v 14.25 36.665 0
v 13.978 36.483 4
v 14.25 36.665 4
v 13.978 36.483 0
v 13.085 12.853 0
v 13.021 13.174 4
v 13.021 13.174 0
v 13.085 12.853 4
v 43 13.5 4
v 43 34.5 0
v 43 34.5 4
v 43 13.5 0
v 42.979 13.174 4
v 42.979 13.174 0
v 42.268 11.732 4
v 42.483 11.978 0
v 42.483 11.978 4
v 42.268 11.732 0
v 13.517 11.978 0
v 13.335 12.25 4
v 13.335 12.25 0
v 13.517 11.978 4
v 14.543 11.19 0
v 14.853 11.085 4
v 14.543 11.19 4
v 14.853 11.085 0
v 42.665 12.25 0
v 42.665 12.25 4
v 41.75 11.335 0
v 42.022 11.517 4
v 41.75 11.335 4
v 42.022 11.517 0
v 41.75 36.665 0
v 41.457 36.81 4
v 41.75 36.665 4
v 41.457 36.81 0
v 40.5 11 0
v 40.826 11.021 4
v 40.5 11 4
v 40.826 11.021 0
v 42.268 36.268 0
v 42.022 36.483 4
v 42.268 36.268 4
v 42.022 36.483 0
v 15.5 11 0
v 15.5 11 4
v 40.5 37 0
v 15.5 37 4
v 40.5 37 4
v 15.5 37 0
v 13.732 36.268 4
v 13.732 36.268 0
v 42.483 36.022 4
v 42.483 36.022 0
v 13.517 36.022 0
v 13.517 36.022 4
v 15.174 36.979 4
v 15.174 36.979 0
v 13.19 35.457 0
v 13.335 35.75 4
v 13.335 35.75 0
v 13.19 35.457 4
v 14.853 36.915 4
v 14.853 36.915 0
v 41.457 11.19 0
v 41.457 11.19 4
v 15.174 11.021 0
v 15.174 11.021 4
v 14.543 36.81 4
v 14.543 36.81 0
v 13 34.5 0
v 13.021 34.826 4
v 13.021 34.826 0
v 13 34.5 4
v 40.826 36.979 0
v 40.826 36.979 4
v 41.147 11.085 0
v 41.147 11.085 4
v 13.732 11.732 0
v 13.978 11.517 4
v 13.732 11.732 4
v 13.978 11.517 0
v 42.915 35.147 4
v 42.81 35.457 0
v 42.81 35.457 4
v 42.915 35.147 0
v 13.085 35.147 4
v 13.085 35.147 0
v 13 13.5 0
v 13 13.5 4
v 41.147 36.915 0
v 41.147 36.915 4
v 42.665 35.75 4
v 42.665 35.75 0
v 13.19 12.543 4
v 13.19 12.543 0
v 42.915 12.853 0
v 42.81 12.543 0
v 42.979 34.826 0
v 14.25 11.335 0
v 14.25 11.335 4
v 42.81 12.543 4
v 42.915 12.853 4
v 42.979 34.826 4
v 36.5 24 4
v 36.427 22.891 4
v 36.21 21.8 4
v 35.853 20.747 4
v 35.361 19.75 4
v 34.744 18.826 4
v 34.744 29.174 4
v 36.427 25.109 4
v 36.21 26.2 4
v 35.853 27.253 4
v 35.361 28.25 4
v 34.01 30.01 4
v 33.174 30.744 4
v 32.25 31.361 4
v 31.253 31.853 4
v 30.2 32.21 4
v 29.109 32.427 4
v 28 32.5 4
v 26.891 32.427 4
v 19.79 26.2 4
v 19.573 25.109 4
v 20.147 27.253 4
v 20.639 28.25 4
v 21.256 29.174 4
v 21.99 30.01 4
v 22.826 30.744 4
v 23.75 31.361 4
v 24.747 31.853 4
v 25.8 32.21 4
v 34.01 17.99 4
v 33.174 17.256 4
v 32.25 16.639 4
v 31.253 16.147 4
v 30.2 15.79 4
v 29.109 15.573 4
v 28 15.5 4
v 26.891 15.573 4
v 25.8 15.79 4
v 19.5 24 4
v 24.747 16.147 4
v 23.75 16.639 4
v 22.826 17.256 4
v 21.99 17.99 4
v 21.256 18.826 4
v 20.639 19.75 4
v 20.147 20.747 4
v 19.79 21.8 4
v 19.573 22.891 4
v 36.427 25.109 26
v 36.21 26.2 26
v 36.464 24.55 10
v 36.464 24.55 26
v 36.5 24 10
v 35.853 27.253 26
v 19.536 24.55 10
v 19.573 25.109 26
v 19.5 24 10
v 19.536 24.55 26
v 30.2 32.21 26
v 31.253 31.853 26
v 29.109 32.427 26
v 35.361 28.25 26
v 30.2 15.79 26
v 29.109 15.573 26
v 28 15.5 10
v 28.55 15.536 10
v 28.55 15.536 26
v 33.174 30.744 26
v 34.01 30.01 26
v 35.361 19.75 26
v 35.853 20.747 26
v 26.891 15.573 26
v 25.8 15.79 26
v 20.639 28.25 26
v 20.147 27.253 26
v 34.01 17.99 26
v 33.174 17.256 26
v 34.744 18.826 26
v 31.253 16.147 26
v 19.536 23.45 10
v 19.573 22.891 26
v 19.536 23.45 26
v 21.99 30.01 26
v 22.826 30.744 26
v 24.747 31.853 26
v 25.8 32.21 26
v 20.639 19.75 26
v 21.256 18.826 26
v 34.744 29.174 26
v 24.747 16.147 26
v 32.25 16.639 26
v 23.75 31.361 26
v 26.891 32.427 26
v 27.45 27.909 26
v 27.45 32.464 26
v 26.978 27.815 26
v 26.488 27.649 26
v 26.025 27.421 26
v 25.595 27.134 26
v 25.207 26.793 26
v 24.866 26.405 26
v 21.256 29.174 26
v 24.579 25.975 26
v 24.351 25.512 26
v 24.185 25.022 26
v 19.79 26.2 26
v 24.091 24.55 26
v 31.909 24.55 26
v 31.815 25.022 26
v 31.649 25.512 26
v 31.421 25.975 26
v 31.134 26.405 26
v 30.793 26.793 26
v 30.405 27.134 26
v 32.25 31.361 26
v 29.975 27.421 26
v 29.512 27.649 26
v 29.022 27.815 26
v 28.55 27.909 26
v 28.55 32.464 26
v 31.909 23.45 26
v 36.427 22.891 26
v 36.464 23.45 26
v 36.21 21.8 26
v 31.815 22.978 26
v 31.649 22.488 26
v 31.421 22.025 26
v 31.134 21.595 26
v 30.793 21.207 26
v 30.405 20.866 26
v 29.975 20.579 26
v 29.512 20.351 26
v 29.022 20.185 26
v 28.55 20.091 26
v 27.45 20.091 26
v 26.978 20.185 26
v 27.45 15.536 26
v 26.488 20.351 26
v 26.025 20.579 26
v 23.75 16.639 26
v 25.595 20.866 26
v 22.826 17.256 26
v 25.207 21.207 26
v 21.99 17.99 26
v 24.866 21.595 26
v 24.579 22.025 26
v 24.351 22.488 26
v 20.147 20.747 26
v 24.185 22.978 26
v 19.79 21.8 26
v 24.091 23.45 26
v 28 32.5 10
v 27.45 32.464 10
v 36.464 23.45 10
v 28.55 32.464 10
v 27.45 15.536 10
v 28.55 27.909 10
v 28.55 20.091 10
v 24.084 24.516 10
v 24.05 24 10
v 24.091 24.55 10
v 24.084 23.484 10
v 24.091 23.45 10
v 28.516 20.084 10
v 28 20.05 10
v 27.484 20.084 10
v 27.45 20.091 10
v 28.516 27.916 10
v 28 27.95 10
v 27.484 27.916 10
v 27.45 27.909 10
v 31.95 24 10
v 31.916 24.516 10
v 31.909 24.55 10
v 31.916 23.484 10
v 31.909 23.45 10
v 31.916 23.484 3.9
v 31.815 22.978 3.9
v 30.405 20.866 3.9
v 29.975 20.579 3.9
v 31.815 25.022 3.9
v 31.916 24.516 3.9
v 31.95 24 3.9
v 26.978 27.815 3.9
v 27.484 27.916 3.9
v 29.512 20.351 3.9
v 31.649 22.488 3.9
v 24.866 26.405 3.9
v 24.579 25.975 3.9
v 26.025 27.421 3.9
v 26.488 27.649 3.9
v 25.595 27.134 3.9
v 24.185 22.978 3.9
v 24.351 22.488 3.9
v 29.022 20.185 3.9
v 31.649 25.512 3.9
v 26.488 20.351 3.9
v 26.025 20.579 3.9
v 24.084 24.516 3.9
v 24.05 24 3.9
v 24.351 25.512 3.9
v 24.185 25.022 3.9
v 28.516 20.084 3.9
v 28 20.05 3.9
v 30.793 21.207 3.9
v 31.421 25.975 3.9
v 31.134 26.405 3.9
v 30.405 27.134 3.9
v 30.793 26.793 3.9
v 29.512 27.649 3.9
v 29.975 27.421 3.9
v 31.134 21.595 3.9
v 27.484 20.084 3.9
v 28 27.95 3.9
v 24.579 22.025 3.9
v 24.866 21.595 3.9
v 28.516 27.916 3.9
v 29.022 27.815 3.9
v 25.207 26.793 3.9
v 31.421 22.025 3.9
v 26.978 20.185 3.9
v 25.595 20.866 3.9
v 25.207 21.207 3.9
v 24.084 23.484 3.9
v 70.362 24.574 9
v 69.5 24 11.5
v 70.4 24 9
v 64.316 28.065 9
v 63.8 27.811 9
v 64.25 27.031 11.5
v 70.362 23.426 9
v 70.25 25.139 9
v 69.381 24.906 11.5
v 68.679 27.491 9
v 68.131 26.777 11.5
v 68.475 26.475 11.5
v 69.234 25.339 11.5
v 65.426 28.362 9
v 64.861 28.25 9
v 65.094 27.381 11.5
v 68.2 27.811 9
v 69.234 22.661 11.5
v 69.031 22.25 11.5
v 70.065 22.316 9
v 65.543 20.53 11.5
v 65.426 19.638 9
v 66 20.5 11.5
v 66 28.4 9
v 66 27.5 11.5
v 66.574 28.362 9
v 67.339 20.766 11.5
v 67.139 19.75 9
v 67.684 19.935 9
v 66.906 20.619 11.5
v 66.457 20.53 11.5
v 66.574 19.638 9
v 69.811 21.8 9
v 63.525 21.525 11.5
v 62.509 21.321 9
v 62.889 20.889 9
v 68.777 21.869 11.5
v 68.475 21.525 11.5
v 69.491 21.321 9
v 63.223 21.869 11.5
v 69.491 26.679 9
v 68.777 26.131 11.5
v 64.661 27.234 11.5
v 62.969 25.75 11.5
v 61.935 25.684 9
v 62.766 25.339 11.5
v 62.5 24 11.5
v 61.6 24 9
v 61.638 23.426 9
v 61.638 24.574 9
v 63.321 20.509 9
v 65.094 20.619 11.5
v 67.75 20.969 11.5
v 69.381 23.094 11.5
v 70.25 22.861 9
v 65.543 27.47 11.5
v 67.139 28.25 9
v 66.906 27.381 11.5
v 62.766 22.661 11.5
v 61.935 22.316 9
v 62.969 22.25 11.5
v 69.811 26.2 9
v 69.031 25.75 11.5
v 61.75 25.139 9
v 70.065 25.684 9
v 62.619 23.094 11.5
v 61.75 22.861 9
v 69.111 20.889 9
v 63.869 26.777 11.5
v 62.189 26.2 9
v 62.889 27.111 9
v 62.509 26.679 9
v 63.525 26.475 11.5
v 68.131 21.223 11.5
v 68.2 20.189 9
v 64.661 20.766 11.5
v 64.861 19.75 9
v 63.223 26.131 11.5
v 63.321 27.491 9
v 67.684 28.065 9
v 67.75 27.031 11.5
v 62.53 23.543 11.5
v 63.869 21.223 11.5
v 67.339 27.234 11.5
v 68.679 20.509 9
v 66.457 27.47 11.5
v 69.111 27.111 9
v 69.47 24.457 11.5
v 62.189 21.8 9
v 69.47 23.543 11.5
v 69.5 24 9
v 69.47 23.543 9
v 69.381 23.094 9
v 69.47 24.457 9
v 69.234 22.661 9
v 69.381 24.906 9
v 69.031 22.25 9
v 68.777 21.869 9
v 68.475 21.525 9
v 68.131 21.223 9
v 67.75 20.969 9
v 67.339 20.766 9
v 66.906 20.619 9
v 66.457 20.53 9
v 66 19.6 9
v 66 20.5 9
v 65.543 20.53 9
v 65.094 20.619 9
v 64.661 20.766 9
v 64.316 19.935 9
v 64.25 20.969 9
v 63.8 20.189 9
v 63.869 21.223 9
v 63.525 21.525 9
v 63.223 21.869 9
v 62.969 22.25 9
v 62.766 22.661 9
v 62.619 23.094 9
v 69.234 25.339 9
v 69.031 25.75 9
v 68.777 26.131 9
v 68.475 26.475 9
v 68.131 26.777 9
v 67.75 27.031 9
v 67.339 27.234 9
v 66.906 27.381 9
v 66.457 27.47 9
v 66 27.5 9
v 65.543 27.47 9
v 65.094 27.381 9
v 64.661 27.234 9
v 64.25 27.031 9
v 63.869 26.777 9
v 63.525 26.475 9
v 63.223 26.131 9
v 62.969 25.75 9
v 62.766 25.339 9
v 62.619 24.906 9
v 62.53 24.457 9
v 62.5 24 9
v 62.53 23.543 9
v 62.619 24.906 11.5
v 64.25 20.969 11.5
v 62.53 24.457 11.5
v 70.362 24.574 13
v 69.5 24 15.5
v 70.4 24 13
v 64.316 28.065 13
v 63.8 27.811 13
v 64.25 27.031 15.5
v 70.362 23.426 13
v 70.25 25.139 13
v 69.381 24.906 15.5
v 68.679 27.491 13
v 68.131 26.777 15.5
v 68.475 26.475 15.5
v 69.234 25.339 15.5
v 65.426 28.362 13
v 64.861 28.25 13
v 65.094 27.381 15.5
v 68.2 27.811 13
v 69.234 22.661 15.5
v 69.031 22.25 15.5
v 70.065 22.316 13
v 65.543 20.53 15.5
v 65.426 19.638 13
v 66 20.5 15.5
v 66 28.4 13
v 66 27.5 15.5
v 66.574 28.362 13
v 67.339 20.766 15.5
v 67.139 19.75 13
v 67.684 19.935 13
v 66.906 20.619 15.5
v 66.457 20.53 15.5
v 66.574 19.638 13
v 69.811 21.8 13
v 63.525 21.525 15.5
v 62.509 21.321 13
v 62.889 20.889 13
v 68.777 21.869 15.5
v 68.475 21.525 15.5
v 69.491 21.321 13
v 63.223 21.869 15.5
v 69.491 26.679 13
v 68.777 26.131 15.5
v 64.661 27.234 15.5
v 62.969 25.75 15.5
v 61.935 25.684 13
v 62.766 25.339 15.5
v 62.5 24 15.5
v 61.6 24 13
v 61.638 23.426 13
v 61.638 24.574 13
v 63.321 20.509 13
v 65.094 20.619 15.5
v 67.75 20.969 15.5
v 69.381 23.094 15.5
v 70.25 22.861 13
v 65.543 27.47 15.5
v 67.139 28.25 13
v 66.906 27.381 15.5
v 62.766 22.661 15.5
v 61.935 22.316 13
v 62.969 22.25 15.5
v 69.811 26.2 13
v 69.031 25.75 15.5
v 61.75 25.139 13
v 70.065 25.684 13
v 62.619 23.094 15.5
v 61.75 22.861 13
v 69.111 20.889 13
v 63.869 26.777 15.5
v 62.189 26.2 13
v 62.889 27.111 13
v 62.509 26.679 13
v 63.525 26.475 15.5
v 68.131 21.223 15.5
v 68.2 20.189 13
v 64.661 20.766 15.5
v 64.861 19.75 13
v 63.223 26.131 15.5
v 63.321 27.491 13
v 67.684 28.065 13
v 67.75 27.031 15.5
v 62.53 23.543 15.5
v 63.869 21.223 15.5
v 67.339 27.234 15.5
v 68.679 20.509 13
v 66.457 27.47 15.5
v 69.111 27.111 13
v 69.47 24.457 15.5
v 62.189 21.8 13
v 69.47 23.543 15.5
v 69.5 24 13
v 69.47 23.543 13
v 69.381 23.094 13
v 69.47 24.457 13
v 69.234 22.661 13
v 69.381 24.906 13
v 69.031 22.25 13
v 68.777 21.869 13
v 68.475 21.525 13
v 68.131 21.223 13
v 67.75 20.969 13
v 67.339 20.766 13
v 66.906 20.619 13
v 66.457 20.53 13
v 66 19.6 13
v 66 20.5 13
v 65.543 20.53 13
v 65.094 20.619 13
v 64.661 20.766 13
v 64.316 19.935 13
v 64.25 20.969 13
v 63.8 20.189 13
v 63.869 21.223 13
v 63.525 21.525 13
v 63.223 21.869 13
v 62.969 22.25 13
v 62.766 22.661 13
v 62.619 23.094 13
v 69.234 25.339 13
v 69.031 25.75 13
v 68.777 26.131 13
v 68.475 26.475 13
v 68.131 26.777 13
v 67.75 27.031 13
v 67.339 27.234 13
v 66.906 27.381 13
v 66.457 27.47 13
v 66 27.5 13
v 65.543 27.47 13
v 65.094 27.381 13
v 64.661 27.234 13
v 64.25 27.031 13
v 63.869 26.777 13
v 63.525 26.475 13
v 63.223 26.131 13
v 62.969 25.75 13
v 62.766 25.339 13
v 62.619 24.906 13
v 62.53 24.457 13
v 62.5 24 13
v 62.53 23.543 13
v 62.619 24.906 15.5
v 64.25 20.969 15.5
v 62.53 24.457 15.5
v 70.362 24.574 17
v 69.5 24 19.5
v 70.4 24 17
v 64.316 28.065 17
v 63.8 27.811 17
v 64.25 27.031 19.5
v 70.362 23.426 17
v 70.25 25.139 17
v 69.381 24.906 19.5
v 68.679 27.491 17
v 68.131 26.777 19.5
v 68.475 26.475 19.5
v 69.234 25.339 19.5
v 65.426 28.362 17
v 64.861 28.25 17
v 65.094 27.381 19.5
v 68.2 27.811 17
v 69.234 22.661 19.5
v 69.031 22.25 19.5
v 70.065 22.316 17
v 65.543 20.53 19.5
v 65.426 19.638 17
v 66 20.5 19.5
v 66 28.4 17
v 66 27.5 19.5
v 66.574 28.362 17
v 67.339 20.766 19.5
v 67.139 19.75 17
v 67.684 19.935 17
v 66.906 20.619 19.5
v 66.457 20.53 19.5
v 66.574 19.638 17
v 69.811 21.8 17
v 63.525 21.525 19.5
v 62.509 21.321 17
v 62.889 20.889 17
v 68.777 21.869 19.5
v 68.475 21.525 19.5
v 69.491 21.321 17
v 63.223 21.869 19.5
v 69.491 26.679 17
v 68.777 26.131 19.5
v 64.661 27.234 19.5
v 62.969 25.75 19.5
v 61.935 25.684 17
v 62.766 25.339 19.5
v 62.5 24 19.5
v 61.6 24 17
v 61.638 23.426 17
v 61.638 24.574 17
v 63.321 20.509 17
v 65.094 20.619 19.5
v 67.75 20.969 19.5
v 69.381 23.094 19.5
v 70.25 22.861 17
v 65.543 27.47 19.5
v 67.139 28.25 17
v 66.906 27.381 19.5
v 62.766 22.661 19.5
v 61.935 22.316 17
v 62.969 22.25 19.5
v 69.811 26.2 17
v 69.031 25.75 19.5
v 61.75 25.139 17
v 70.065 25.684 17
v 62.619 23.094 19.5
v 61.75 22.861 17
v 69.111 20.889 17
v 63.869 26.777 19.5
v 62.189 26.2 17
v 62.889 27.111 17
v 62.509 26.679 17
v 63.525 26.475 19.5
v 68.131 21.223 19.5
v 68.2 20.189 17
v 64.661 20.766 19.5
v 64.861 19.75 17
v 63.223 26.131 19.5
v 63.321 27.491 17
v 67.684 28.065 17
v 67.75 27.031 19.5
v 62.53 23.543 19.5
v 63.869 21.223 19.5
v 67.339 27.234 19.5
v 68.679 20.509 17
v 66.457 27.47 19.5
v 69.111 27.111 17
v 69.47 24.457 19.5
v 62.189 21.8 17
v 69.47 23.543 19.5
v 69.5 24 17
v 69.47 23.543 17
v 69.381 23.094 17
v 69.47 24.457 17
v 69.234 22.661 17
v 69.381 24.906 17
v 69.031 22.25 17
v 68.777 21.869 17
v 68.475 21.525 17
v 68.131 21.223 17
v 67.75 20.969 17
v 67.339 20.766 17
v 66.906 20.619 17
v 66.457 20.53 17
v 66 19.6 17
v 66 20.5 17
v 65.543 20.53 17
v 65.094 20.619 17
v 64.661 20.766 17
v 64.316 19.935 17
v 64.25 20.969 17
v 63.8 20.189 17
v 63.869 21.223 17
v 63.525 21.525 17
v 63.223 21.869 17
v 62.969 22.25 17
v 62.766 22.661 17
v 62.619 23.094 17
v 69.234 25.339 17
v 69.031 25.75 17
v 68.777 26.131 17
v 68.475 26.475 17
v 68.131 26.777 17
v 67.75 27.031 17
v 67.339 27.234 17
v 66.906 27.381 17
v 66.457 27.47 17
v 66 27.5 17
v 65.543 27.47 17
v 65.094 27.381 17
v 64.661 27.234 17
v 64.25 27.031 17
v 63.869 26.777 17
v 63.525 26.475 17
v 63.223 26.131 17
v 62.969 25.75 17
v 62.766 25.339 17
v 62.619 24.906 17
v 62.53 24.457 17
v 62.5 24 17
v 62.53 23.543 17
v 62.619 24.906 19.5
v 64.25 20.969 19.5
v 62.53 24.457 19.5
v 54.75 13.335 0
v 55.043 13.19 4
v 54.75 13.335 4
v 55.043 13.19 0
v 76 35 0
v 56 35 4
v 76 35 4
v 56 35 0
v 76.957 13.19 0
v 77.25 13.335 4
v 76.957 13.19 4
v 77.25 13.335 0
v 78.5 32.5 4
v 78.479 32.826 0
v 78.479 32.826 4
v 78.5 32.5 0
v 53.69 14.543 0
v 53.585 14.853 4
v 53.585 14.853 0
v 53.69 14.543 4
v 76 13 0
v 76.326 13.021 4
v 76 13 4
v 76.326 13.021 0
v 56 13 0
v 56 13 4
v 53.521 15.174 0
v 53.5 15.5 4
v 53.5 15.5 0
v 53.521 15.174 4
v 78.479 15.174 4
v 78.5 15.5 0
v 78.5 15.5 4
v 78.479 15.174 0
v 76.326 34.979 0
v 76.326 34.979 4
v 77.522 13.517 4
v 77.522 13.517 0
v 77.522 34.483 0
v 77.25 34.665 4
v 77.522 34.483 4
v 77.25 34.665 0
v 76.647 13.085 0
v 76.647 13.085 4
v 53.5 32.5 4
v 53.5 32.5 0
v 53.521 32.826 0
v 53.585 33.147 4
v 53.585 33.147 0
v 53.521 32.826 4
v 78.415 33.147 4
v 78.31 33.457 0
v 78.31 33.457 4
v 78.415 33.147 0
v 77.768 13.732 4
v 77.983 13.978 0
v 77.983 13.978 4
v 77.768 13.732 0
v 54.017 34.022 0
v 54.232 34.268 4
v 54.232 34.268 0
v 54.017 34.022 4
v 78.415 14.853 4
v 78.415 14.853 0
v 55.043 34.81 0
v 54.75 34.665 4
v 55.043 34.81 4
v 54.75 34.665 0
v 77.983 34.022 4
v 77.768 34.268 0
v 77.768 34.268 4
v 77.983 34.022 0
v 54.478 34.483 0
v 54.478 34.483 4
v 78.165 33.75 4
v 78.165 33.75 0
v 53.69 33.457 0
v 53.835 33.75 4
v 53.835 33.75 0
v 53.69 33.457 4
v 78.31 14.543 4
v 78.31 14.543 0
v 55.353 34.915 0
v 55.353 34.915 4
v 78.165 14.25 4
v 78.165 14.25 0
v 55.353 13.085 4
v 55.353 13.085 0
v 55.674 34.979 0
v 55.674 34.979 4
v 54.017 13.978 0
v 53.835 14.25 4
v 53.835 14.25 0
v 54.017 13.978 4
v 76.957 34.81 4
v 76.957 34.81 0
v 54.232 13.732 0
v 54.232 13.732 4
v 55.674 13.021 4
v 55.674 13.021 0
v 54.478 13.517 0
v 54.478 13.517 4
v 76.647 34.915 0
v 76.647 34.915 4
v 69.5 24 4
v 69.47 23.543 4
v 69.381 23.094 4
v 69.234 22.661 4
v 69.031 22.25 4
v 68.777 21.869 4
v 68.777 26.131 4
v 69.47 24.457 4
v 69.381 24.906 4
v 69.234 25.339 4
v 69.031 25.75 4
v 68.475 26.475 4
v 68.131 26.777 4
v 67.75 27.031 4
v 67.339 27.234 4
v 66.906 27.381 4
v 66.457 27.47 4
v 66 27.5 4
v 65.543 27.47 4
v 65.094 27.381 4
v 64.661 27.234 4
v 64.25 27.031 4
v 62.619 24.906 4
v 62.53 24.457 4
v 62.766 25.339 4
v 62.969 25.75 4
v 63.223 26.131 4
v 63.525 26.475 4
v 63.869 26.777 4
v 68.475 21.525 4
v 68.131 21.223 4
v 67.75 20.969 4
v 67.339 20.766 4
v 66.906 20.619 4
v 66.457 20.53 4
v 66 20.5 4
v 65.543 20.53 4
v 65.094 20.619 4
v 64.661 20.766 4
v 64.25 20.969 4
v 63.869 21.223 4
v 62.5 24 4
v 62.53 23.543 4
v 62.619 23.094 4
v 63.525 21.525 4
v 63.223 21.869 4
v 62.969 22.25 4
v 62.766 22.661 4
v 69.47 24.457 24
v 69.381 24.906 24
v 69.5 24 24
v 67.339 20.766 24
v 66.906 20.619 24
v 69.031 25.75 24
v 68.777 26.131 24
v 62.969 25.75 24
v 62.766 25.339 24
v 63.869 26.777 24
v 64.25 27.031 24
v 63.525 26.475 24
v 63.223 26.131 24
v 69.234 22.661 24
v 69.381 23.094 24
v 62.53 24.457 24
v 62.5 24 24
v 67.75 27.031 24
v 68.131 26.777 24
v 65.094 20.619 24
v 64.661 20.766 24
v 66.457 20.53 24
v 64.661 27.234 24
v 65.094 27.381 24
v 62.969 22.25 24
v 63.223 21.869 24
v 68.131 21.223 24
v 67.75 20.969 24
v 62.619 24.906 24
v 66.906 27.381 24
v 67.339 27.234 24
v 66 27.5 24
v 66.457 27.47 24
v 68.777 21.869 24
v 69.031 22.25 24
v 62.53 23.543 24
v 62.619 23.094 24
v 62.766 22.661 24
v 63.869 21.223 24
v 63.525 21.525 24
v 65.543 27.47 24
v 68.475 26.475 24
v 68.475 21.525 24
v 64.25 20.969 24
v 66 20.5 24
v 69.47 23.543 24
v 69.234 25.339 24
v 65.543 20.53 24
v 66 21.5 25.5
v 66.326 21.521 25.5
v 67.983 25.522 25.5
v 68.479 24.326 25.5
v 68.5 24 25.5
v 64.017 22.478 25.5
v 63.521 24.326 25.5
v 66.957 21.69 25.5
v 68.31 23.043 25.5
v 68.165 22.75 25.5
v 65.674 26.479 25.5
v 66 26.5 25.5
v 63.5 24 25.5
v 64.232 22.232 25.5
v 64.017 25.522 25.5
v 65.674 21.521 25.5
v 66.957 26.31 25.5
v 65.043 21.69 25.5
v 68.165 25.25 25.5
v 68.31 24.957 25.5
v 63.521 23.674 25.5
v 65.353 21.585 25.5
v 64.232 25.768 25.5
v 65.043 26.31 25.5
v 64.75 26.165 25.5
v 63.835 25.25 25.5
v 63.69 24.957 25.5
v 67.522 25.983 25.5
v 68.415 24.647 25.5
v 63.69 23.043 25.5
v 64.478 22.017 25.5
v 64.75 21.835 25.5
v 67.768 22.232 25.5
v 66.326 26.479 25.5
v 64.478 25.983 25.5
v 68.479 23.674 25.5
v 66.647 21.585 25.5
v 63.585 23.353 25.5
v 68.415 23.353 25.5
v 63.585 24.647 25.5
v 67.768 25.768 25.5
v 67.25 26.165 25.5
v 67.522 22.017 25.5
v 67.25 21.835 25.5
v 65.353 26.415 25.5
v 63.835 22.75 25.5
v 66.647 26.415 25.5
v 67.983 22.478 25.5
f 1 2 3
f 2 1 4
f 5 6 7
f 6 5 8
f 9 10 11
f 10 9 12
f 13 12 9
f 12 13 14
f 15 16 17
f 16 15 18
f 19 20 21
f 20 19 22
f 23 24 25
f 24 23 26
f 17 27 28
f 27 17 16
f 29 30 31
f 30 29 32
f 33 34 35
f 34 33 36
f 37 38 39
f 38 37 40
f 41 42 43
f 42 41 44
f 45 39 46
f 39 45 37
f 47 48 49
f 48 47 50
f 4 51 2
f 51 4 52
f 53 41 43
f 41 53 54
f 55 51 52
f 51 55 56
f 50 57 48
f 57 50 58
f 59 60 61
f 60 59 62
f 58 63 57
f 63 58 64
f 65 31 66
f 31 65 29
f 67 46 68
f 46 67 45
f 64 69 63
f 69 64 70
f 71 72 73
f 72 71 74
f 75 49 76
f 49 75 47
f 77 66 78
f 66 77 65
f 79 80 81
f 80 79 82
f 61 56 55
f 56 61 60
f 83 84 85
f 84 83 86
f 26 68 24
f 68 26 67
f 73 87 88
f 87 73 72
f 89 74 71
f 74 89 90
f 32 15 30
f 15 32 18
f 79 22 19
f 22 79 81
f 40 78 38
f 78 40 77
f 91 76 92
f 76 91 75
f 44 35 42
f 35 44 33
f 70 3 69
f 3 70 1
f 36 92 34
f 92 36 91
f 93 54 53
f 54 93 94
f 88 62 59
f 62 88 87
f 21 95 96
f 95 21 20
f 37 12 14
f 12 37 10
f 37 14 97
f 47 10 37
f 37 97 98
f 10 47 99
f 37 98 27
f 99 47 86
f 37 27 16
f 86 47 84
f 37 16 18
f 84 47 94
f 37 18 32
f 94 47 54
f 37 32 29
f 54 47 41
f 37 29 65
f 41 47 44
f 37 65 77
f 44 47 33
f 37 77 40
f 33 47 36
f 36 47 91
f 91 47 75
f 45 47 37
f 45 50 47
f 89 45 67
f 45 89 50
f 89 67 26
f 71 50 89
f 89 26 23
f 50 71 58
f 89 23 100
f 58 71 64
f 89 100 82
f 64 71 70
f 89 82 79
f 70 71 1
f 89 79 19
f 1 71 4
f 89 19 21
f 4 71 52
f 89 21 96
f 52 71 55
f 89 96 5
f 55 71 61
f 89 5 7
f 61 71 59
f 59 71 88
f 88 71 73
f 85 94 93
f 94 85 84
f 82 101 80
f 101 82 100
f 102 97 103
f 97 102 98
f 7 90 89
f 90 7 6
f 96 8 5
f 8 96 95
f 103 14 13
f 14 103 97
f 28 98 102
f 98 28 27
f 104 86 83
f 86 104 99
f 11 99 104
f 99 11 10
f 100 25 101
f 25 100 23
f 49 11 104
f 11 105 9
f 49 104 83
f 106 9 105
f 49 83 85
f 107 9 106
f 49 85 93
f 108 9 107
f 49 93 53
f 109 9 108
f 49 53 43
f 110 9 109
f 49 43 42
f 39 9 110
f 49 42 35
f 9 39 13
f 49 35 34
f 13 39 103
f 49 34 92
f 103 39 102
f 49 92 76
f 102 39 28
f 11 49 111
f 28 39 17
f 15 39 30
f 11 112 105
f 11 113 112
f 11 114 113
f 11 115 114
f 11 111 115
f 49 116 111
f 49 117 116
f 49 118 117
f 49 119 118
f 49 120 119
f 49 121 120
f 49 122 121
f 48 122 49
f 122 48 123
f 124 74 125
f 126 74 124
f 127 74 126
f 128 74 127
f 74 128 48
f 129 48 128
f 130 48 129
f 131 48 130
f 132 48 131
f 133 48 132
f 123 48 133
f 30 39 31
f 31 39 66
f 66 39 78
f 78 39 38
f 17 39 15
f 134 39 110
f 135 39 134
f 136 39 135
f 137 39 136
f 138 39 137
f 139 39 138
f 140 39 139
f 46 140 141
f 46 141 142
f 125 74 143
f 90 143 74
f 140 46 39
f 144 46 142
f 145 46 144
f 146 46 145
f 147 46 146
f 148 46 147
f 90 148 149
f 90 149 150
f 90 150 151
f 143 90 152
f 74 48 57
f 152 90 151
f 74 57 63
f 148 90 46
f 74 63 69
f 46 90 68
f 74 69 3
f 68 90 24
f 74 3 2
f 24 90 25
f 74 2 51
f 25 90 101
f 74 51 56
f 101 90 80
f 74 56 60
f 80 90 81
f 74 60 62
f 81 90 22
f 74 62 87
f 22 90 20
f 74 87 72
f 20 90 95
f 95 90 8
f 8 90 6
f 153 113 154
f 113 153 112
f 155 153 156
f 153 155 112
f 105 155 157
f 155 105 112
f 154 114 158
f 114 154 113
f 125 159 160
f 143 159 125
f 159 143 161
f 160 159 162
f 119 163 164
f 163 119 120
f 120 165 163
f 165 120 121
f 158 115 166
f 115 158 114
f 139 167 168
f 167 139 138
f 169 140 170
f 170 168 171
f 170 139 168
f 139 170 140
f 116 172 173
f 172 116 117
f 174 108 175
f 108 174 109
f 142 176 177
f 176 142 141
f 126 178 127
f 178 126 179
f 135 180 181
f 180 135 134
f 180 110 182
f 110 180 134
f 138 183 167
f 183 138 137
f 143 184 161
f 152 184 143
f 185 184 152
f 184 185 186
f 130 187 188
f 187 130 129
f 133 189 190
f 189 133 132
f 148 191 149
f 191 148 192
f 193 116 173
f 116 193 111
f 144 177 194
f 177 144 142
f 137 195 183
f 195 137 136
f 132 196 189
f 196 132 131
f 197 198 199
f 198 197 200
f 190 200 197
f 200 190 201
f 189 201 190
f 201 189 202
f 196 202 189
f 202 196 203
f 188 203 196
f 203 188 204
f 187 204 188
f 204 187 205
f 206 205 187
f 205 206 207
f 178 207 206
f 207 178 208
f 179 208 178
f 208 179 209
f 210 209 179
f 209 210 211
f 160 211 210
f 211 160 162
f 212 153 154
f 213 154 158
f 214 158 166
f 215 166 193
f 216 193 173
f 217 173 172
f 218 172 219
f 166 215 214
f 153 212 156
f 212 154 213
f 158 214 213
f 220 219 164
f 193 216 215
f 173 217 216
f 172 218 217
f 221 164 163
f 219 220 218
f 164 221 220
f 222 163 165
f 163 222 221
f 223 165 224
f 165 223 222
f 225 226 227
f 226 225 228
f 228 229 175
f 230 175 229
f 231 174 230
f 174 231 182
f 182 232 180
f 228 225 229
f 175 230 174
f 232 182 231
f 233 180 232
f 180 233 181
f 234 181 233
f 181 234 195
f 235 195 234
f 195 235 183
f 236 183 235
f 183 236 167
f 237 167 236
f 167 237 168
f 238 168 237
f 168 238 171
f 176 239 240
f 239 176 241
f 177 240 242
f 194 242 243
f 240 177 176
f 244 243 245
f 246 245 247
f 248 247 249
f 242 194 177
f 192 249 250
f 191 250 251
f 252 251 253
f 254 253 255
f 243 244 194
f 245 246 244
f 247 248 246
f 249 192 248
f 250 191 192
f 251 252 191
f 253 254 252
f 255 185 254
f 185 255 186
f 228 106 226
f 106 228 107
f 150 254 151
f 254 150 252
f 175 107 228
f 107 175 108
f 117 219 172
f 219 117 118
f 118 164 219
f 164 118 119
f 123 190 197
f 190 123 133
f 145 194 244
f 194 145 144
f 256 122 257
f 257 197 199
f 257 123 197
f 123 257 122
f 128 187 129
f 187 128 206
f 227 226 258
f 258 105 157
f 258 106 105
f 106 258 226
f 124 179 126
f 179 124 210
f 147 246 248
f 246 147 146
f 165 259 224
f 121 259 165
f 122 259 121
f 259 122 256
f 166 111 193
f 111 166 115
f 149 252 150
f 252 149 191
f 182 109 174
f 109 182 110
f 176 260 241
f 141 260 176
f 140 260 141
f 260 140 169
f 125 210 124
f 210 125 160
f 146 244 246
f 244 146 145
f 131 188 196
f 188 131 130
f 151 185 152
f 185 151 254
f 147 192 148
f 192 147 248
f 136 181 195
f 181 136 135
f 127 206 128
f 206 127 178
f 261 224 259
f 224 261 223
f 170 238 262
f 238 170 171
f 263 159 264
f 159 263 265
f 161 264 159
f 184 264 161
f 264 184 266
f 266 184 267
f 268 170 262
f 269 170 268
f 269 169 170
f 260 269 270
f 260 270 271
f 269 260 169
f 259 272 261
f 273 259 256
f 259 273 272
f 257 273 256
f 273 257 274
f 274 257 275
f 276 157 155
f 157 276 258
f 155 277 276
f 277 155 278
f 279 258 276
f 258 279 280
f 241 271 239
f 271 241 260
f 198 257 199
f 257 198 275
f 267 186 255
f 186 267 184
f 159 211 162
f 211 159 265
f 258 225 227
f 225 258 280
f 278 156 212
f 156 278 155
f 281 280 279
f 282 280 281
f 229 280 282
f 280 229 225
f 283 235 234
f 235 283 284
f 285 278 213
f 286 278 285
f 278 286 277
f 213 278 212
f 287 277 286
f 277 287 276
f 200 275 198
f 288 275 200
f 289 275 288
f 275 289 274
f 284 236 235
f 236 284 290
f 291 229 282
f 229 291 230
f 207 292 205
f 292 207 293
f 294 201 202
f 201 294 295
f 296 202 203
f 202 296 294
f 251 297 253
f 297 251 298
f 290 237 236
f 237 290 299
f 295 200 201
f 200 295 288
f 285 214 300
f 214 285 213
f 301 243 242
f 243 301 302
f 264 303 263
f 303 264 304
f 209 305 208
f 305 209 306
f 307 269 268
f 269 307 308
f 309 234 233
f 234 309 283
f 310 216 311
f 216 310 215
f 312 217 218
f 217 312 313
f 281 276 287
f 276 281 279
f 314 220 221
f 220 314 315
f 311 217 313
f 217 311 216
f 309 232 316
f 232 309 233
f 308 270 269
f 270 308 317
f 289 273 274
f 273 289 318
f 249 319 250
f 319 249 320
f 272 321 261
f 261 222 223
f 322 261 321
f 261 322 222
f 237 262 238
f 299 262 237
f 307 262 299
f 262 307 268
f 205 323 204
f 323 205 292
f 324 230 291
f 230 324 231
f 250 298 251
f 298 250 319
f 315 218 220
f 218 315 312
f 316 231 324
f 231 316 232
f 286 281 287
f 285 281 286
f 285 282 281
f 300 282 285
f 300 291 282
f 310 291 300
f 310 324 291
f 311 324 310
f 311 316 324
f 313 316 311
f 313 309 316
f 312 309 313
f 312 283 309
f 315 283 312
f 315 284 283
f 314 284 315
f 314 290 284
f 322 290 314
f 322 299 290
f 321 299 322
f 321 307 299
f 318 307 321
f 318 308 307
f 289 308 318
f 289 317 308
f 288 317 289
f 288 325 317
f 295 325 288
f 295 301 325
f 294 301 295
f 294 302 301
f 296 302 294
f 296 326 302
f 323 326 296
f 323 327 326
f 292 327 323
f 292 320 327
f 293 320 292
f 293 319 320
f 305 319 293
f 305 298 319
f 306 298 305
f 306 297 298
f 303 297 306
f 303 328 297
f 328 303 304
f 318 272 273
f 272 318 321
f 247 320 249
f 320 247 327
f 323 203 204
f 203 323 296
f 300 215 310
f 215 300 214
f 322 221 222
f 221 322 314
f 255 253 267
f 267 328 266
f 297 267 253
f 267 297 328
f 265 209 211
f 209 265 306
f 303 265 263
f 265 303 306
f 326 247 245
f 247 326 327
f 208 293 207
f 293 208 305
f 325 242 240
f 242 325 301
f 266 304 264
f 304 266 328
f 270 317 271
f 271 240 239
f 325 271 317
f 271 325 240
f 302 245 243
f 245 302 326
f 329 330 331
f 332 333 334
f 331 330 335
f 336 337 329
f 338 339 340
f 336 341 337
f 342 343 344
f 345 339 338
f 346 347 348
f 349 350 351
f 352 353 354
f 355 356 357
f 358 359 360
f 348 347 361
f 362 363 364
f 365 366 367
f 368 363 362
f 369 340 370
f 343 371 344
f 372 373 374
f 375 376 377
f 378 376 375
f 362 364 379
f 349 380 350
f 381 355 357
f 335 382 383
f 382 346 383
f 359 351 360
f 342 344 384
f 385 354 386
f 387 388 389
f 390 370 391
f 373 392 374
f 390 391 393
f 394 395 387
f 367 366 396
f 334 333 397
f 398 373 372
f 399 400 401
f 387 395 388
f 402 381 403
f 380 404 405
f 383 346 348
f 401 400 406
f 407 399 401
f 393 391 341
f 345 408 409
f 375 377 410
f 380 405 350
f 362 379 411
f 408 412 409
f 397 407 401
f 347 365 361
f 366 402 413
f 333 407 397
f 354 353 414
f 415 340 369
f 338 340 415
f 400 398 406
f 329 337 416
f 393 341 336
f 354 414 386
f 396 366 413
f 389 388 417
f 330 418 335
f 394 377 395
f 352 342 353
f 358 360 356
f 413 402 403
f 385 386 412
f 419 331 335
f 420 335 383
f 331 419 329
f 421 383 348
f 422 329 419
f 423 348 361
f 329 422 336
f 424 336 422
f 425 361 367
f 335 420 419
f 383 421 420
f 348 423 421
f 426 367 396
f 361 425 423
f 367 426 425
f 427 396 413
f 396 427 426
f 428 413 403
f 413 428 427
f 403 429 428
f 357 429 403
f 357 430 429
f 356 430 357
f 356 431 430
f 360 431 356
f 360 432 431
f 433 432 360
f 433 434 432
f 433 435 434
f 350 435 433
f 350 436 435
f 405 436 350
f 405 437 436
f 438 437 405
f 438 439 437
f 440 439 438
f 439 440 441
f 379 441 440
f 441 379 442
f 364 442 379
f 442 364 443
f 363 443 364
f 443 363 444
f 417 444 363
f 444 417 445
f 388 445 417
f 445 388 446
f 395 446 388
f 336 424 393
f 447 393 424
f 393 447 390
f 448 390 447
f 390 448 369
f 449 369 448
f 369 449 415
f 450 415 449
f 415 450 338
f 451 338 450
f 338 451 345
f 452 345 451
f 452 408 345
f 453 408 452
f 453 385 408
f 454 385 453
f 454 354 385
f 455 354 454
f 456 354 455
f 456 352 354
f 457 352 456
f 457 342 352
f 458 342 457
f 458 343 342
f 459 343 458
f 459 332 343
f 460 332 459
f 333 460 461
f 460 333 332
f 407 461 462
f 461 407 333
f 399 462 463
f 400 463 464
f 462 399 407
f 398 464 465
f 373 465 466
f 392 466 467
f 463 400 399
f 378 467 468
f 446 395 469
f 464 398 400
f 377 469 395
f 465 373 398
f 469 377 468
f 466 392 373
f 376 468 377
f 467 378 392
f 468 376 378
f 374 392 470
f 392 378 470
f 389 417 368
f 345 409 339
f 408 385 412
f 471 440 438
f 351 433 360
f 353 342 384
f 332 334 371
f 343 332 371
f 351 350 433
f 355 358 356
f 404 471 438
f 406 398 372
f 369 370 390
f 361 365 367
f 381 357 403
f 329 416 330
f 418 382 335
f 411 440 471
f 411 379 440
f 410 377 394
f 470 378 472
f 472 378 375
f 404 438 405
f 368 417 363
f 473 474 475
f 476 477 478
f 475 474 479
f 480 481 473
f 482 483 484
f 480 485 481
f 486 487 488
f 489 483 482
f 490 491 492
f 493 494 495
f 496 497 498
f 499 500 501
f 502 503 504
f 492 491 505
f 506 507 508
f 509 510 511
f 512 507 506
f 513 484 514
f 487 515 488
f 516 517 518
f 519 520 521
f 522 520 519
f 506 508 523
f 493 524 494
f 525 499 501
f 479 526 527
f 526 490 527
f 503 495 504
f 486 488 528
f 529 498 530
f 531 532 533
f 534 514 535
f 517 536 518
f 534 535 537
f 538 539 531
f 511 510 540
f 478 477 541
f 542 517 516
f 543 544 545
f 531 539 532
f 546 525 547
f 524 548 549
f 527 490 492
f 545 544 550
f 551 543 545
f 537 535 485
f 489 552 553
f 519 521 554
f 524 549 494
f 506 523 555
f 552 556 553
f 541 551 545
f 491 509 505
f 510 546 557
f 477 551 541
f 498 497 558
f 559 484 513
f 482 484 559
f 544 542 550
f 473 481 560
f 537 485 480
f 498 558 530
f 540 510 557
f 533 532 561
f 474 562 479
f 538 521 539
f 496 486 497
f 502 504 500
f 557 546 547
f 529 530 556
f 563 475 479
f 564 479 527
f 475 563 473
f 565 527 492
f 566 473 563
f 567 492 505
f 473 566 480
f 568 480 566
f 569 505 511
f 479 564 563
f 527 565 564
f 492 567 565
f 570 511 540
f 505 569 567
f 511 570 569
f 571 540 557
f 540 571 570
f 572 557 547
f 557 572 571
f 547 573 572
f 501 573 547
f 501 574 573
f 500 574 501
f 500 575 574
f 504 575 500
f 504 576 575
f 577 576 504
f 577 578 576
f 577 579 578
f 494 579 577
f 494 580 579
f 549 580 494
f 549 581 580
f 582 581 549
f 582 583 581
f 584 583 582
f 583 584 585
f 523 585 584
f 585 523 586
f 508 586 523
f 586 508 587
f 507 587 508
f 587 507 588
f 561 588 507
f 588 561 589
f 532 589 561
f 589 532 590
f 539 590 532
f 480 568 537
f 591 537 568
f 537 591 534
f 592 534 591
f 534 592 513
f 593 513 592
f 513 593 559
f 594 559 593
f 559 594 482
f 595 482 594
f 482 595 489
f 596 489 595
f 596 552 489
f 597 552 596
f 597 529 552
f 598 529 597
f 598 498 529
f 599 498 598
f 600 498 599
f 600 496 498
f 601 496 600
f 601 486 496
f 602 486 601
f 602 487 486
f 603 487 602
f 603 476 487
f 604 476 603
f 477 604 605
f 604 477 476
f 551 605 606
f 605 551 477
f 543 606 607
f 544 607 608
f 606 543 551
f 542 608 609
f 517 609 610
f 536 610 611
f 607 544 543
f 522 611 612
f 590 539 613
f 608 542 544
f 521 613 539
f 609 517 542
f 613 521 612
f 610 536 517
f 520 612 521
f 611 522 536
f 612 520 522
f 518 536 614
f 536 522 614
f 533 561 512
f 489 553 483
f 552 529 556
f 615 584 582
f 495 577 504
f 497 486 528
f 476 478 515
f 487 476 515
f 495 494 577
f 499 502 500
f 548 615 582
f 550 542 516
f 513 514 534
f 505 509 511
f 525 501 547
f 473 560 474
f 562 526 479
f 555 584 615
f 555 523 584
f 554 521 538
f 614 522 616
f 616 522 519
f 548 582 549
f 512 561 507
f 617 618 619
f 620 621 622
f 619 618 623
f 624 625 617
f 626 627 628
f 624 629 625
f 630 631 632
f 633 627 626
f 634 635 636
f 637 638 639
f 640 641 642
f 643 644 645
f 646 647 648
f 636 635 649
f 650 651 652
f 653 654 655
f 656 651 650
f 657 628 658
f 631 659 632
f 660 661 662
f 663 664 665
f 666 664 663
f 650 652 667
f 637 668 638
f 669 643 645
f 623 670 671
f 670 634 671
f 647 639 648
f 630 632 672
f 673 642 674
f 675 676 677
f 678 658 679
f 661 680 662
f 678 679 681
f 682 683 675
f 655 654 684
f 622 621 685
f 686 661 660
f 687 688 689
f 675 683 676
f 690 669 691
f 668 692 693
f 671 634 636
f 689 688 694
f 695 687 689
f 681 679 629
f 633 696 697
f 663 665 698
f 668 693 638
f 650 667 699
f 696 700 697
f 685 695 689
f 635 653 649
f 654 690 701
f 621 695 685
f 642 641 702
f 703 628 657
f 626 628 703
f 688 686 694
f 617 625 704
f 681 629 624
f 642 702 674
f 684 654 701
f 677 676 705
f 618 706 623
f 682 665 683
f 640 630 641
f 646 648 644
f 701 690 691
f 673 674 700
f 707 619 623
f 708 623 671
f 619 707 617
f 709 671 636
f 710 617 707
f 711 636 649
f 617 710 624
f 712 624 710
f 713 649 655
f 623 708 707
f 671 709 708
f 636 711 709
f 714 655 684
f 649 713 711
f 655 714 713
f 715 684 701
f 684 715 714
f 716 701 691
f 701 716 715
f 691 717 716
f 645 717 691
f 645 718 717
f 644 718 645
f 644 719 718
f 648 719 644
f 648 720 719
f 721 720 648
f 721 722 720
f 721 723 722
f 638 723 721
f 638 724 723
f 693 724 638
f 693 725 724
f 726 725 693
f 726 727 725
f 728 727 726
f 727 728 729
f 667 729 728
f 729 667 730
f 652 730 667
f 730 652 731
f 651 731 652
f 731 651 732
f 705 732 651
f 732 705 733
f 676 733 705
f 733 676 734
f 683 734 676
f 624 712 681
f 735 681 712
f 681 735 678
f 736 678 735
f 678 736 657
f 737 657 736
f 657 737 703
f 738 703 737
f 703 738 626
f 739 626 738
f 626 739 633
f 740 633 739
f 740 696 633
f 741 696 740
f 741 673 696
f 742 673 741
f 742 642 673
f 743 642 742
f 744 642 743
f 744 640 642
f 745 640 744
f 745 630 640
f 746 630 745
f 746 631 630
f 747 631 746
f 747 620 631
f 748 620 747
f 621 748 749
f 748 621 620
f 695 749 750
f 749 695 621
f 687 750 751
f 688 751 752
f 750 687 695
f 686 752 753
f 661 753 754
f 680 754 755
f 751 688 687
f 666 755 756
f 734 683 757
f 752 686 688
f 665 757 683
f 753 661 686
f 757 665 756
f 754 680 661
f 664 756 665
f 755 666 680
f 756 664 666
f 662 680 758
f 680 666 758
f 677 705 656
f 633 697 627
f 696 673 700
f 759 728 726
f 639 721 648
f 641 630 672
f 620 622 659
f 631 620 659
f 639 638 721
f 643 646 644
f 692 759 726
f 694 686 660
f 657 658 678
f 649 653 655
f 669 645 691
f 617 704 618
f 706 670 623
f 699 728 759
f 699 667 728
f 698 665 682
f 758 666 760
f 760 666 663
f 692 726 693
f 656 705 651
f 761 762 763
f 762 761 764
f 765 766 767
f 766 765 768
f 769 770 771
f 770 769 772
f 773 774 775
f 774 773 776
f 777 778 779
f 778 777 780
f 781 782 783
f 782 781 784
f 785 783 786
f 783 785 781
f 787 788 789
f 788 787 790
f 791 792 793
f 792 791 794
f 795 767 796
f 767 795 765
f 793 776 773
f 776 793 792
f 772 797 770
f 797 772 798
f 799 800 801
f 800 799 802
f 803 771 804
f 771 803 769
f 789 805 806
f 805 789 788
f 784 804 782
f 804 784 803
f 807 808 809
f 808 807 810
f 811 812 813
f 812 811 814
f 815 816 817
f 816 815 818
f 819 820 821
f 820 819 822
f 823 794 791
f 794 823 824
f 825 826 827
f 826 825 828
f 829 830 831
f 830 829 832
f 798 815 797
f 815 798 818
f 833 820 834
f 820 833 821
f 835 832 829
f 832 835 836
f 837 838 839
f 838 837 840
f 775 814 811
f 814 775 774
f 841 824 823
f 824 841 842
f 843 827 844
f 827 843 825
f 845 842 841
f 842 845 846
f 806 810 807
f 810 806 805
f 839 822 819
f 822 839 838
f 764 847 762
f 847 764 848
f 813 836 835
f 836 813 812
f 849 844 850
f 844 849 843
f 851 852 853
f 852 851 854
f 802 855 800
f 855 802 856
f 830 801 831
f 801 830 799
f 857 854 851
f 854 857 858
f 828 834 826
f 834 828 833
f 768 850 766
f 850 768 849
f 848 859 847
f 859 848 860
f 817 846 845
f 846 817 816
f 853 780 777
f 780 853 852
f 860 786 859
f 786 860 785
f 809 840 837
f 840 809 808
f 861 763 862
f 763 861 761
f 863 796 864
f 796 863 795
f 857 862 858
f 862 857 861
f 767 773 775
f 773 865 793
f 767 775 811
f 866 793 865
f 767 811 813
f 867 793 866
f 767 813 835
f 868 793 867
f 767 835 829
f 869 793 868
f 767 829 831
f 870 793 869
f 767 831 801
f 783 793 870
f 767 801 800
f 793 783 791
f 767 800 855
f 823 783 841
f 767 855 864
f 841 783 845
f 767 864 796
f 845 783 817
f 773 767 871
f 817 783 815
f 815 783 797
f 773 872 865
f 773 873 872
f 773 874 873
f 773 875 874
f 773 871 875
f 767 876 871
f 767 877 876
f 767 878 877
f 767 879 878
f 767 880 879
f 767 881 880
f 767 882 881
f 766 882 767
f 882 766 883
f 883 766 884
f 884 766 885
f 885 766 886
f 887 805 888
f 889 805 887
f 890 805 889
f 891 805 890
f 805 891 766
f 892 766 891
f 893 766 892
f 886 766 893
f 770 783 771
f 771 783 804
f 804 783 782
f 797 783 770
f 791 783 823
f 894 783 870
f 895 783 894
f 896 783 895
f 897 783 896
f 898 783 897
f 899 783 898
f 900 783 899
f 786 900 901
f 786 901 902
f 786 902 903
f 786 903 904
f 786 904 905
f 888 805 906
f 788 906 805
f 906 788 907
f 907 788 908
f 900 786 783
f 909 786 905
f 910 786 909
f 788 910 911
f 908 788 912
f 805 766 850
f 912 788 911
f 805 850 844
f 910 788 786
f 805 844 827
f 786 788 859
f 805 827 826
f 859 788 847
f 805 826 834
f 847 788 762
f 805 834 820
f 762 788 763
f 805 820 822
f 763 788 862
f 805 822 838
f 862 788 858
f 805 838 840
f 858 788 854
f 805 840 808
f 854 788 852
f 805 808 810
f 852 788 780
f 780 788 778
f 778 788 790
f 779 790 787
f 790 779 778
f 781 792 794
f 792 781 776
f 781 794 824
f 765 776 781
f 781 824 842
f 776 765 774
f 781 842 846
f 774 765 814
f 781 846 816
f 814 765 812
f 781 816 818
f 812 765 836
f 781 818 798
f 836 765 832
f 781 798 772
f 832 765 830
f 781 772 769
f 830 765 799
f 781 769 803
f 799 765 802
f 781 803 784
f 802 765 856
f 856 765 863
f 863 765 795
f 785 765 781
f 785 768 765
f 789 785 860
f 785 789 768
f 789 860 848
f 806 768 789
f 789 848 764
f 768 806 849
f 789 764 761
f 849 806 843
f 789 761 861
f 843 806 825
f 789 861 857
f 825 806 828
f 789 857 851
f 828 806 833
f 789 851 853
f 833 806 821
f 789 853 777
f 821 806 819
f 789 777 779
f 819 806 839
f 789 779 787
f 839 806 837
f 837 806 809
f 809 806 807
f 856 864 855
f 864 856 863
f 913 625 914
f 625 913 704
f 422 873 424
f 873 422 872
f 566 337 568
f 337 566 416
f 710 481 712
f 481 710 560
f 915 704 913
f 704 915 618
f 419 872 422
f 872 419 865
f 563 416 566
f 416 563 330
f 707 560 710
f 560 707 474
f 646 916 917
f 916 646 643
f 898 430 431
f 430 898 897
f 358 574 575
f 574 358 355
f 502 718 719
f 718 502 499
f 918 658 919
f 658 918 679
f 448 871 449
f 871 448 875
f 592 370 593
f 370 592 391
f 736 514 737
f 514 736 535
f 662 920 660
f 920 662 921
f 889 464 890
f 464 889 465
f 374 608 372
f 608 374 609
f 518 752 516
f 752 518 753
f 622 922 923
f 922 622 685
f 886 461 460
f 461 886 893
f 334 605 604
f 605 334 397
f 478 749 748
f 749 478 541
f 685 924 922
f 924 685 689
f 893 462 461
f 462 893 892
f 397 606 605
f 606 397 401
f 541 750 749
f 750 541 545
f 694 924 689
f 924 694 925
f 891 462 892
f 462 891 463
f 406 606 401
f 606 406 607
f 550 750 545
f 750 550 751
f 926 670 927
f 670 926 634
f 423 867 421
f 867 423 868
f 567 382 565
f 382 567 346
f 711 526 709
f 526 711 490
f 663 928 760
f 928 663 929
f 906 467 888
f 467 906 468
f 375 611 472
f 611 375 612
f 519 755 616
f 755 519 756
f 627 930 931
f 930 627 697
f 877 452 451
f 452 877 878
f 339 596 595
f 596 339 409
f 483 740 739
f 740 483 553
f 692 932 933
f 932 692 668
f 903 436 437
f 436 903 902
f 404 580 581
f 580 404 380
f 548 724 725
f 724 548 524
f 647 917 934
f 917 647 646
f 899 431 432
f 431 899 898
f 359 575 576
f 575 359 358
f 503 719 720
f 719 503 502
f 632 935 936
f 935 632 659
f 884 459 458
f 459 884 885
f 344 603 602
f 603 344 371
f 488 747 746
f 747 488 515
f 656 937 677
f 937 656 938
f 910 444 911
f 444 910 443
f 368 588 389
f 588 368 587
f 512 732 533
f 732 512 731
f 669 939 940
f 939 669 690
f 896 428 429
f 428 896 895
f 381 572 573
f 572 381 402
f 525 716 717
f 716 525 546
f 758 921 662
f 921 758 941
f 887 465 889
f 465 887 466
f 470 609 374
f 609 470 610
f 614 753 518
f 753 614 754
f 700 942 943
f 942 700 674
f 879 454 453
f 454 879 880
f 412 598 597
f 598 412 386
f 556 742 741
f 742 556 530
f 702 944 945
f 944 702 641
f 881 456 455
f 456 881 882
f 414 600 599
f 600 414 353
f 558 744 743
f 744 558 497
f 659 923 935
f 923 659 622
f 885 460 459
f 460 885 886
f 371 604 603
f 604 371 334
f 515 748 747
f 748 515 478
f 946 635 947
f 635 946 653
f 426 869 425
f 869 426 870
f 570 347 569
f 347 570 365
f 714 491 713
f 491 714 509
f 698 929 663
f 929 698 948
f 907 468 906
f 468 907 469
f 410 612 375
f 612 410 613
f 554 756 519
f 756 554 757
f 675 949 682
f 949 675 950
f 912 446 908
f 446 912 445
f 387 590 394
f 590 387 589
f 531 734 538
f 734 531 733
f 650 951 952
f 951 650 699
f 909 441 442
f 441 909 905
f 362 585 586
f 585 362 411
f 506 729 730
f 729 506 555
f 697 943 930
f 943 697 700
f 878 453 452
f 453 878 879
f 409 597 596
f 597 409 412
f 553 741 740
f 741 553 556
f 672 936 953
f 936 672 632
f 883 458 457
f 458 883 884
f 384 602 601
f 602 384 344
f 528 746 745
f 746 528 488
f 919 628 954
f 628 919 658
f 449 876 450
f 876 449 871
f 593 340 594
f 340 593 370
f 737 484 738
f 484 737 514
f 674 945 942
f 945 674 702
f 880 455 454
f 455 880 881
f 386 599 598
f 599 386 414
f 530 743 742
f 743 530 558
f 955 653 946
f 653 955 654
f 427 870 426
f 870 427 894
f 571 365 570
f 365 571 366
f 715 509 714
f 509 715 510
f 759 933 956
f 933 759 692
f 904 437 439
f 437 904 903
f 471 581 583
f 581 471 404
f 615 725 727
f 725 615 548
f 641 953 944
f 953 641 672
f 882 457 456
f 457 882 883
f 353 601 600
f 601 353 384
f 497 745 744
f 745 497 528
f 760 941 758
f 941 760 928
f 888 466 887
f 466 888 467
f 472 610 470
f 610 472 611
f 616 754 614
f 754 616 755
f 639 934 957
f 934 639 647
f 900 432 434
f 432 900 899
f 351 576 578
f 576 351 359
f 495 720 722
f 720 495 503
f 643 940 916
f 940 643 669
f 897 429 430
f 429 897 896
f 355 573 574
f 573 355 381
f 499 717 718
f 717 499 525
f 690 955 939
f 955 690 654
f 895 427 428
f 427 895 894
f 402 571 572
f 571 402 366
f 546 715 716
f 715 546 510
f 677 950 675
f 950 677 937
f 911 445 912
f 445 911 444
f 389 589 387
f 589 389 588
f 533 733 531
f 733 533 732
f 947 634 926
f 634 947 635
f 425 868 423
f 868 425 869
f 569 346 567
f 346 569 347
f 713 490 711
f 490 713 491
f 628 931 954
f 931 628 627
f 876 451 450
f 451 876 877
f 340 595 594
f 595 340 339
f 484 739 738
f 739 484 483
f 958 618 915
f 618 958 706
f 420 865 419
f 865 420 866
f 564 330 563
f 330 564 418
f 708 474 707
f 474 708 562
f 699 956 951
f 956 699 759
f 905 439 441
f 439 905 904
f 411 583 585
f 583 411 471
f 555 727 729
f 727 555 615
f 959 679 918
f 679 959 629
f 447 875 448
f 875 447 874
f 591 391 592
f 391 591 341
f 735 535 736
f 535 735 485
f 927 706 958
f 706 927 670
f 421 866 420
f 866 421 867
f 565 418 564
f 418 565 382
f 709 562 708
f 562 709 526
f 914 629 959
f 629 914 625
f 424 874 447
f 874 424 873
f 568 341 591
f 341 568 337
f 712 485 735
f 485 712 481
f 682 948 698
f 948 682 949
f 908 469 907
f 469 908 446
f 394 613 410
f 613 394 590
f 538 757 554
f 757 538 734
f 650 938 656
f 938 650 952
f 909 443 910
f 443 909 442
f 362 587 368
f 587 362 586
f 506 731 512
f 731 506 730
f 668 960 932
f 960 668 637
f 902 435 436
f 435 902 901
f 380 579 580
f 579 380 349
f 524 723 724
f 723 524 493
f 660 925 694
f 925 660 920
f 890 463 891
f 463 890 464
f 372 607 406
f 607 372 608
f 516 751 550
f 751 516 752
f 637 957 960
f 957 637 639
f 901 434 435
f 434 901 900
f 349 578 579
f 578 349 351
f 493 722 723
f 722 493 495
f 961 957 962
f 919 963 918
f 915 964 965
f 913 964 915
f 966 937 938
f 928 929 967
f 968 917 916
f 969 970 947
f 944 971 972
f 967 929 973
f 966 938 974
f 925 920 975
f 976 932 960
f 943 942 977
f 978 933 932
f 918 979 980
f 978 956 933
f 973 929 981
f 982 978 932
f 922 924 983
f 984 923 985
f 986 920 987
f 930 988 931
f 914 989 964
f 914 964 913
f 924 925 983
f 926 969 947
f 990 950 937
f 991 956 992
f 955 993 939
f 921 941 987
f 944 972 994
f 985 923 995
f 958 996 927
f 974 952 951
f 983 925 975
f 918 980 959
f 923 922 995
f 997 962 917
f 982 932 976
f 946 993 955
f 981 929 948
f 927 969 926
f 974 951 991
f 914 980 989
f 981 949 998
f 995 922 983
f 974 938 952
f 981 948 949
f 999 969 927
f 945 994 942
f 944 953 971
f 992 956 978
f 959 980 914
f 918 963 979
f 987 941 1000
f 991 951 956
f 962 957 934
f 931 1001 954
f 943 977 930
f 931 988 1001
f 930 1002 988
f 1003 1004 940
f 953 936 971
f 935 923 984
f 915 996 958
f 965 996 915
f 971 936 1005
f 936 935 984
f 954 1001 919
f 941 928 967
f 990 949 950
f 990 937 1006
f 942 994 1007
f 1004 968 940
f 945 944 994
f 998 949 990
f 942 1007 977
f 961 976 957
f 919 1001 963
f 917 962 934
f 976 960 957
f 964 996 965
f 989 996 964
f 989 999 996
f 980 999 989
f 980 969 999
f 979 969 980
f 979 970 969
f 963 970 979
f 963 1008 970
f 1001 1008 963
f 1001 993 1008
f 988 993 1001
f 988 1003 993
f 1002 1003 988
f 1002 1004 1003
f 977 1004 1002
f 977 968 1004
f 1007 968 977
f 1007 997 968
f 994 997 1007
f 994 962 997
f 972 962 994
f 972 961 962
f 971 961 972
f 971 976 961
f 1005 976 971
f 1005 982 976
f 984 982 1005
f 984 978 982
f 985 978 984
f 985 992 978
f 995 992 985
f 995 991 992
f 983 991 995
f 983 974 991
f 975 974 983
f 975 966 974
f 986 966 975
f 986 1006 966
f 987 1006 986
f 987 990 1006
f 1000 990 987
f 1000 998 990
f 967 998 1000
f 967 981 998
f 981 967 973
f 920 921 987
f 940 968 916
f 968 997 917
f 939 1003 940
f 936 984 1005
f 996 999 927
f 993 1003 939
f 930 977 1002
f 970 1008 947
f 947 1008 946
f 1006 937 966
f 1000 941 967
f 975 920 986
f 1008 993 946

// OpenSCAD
/*
Sample 048: Einweg-Steckverbinder mit Widerhaken — 0,45 mm
Generated from the FDM Mechanical Sample Library.
Units: millimetres.

Override examples:
  openscad -o custom.stl -D 'view="plate"' -D 'render_fn=64' model.scad
  openscad -o preview.png -D 'view="assembly"' model.scad
*/
use <../../../library/fdm_mechanisms.scad>

render_fn = is_undef(render_fn) ? 48 : render_fn;
view = is_undef(view) ? "plate" : view;
$fn = render_fn;

sample_barbed_connector(
    view=view,
    clearance=0.45,
    pin_d=7,
    barb_h=0.9
);
